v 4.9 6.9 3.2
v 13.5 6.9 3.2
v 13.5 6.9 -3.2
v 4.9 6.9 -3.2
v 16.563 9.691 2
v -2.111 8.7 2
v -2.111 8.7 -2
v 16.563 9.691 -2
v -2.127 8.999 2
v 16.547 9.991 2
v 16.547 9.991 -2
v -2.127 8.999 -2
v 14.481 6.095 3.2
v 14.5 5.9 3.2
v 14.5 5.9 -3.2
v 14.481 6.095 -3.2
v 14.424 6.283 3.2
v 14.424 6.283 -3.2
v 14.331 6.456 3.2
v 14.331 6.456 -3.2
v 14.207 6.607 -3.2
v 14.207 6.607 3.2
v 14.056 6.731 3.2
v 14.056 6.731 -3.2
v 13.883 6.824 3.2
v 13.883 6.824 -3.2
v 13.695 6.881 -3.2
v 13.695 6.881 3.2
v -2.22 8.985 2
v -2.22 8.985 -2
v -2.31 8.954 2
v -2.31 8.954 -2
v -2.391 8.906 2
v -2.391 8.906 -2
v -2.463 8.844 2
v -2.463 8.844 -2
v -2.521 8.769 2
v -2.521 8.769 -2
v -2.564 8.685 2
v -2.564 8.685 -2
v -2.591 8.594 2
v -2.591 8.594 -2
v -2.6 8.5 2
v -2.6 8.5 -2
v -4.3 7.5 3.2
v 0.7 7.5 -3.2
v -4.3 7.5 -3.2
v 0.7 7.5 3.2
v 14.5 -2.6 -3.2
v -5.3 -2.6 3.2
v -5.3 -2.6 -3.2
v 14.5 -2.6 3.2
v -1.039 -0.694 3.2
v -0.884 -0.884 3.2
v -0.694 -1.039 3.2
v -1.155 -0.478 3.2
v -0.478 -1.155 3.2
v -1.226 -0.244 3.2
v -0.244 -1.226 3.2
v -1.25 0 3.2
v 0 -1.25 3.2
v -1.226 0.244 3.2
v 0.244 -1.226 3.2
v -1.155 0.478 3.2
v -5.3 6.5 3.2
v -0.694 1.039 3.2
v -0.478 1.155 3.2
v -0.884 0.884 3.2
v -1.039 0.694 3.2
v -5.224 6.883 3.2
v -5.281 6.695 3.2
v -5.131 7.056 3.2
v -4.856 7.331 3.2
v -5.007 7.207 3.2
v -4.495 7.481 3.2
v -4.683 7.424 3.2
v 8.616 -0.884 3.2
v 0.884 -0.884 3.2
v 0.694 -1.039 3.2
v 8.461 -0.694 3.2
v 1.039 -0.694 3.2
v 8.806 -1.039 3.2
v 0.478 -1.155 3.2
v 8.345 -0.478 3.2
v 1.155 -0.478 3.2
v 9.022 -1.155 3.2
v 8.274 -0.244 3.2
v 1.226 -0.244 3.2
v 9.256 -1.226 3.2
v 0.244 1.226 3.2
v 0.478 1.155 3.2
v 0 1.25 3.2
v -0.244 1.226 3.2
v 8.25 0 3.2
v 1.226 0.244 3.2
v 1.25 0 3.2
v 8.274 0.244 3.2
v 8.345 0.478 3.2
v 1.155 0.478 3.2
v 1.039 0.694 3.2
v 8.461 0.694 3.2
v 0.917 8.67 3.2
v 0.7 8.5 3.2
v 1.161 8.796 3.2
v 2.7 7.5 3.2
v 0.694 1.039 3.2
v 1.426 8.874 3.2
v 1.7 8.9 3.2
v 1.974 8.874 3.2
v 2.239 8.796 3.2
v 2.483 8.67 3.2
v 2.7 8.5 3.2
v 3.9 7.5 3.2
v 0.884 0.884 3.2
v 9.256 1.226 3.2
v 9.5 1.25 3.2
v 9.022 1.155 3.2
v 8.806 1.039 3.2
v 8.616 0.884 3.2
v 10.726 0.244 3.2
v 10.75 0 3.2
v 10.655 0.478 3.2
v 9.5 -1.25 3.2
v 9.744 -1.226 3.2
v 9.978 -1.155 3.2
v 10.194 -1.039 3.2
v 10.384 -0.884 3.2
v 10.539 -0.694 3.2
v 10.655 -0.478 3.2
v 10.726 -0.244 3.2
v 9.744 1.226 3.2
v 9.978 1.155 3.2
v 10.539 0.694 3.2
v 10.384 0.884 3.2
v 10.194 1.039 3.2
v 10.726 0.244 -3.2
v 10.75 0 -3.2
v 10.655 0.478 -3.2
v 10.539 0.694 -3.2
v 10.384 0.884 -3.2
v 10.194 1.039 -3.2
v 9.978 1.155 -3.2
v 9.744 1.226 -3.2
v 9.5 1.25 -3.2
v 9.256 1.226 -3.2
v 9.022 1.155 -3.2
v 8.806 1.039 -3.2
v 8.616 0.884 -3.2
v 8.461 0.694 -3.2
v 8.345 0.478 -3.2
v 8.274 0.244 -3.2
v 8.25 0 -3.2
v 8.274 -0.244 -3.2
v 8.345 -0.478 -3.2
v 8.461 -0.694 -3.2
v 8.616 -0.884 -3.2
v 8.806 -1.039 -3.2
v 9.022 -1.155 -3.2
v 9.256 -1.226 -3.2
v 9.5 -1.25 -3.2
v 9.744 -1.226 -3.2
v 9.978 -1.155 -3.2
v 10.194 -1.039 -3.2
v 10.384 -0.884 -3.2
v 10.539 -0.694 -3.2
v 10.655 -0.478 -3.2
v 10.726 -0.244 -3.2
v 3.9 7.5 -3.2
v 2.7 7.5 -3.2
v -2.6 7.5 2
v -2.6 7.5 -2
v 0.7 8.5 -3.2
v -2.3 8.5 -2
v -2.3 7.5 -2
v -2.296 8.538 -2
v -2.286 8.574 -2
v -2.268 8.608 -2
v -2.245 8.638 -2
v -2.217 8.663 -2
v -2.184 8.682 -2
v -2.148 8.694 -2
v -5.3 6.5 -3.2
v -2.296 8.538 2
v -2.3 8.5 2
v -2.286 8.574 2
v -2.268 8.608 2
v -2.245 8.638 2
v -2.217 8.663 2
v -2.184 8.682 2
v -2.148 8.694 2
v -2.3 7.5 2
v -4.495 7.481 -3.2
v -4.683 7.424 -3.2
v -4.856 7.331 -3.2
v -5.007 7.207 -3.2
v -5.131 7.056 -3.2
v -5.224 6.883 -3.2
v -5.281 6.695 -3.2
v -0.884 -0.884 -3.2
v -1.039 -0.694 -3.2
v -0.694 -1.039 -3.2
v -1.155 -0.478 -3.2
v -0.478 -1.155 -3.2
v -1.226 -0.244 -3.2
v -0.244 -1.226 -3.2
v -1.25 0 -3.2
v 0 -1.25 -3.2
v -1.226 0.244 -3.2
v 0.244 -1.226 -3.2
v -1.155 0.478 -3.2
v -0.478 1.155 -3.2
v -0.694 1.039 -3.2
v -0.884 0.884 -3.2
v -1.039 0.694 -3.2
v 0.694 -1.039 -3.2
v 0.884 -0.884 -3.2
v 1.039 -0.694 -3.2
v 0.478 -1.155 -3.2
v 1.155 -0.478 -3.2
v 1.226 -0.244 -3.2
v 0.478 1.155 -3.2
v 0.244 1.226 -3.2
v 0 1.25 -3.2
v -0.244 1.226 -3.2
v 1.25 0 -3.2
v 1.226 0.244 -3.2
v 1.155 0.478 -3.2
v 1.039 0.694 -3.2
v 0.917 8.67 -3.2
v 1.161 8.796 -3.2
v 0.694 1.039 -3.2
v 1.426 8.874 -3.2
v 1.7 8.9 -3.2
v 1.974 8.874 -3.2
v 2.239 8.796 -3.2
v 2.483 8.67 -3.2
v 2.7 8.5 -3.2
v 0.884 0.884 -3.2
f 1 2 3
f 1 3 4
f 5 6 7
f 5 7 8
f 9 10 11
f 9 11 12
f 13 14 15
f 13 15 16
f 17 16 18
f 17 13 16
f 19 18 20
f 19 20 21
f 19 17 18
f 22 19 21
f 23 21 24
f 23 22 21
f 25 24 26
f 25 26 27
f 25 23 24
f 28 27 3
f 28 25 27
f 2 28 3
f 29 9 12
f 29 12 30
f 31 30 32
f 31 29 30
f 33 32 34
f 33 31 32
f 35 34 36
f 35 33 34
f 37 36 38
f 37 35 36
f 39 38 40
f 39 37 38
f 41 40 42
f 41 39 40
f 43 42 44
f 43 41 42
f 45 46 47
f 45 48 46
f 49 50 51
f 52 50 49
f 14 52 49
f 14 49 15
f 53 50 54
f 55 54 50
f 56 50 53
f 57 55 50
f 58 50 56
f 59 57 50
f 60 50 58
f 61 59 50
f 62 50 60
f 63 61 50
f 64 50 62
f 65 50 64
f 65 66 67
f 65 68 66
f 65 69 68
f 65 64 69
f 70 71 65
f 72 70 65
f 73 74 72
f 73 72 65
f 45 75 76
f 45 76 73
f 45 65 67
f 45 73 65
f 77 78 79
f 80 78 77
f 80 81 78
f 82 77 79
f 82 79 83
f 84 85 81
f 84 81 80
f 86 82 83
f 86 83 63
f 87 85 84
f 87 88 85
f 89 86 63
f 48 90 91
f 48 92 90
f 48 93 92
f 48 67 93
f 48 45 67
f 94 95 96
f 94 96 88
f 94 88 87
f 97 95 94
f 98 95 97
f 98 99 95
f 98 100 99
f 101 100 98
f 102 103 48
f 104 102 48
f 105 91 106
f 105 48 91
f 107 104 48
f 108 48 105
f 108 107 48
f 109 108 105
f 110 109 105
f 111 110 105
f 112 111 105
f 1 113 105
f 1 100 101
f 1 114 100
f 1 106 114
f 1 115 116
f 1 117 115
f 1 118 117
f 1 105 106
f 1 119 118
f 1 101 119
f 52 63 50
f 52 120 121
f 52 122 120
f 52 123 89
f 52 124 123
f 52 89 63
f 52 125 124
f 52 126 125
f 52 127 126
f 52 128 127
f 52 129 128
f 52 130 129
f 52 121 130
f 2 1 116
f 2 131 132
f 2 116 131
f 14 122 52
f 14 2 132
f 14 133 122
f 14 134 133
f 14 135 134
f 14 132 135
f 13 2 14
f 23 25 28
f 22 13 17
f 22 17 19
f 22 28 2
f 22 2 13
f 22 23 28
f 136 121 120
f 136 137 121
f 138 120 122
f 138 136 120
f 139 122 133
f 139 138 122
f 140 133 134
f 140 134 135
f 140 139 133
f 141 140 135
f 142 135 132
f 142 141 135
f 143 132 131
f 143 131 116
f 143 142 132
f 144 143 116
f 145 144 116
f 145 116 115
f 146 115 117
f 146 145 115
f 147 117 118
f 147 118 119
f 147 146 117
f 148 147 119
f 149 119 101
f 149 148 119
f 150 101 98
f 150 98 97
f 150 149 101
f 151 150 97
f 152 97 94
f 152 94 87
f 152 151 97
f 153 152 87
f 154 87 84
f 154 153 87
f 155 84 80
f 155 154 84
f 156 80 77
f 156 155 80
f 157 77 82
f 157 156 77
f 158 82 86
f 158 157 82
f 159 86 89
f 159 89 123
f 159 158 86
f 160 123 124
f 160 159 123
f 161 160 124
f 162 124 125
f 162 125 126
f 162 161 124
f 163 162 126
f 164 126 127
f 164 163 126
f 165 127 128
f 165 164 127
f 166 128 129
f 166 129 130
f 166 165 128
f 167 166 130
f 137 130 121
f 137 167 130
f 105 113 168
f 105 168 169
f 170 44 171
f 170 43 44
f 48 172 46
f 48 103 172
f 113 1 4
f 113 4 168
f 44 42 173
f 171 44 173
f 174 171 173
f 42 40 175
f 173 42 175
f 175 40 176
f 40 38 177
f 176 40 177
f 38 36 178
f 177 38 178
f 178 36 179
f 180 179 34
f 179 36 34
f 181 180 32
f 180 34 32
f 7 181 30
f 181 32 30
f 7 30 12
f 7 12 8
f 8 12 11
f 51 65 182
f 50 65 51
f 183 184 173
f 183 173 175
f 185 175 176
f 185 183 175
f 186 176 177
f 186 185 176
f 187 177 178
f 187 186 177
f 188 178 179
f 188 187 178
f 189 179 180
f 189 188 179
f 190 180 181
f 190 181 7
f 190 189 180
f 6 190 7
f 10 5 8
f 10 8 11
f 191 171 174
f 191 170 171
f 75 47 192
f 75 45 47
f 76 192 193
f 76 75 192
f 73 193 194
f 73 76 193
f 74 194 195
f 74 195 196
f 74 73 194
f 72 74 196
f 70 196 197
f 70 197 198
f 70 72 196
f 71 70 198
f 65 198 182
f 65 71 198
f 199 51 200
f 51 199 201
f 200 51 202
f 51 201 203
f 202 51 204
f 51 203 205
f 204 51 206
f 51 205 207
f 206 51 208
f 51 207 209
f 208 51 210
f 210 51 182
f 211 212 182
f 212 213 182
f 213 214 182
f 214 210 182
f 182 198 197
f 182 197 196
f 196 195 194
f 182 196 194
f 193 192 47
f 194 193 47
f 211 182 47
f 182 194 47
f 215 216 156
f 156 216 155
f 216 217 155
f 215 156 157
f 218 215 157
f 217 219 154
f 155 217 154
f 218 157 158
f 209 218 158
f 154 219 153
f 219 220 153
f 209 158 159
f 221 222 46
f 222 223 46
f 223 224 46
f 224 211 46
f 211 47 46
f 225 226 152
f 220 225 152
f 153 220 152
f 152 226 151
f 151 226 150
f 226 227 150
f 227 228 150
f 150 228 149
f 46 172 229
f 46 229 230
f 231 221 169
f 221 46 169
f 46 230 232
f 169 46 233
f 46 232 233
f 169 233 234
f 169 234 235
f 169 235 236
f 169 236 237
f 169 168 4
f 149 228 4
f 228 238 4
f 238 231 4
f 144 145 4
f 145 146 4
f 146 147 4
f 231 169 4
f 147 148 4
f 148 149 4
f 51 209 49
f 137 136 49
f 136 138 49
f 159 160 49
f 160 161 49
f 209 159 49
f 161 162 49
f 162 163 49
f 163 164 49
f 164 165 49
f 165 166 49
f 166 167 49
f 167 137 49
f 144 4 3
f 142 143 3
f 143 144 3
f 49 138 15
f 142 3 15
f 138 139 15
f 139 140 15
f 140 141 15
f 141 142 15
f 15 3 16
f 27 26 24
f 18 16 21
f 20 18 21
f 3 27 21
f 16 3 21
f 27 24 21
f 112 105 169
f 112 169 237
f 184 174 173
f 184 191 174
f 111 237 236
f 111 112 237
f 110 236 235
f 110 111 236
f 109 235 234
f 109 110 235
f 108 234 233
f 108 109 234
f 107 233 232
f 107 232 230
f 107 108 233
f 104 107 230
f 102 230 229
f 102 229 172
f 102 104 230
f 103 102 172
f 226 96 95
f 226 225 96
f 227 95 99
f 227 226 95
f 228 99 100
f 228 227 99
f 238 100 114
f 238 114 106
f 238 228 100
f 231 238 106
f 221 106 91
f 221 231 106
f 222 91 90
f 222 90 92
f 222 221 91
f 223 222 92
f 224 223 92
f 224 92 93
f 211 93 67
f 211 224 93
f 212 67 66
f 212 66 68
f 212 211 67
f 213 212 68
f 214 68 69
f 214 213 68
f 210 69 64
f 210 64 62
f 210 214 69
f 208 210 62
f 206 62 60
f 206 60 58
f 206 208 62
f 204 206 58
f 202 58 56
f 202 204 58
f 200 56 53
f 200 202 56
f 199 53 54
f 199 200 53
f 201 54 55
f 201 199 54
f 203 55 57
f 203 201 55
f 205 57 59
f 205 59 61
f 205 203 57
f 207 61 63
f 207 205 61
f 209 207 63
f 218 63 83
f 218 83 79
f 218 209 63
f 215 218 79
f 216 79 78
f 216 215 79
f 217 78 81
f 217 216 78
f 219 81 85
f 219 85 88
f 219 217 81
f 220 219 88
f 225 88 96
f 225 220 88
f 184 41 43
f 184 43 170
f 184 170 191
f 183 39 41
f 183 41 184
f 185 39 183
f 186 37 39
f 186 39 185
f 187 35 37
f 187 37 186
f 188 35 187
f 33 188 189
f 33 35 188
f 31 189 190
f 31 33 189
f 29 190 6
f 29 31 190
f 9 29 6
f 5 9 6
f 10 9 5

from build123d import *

# Parameters (mm, degrees)
SKETCH1_R           = 1.25
BOSS_EXTRUDE1_DEPTH = 3.2
EXTRUDE_THIN2_DEPTH = 2


with BuildPart() as part:
    # Sketch1 → Boss-Extrude1 (new, symmetric)
    with BuildSketch(Plane.XY):
        with BuildLine():
            Line((-5.3, -2.6), (14.5, -2.6))
            Line((14.5, -2.6), (14.5, 5.9))
            ThreePointArc((14.5, 5.9), (14.207106781, 6.607106781), (13.5, 6.9))
            Line((13.5, 6.9), (4.9, 6.9))
            Line((4.9, 6.9), (3.9, 7.5))
            Line((3.9, 7.5), (2.7, 7.5))
            Line((2.7, 7.5), (2.7, 8.5))
            ThreePointArc((2.7, 8.5), (1.7, 8.9), (0.7, 8.5))
            Line((0.7, 8.5), (0.7, 7.5))
            Line((0.7, 7.5), (-4.3, 7.5))
            ThreePointArc((-4.3, 7.5), (-5.007106781, 7.207106781), (-5.3, 6.5))
            Line((-5.3, 6.5), (-5.3, -2.6))
        make_face()
        Circle(SKETCH1_R, mode=Mode.SUBTRACT)
        with Locations((9.5, 0)):
            Circle(SKETCH1_R, mode=Mode.SUBTRACT)
    extrude(amount=BOSS_EXTRUDE1_DEPTH, both=True)


with BuildPart() as body_2:
    # Sketch2 → Extrude-Thin2 (new, symmetric)
    with BuildSketch(Plane.XY):
        with BuildLine():
            Line((-2.3, 7.5), (-2.3, 8.5))
            ThreePointArc((-2.3, 8.5), (-2.245122034, 8.637621202), (-2.110604047, 8.699718688))
            Line((-2.110604047, 8.699718688), (16.563093247, 9.691197067))
            Line((16.563093247, 9.691197067), (16.547187177, 9.990775098))
            Line((16.547187177, 9.990775098), (-2.126510117, 8.999296719))
            ThreePointArc((-2.126510117, 8.999296719), (-2.462805084, 8.844053006), (-2.6, 8.5))
            Line((-2.6, 8.5), (-2.6, 7.5))
            Line((-2.6, 7.5), (-2.3, 7.5))
        make_face()
    extrude(amount=EXTRUDE_THIN2_DEPTH, both=True)


solid = Compound([part.part, body_2.part])
